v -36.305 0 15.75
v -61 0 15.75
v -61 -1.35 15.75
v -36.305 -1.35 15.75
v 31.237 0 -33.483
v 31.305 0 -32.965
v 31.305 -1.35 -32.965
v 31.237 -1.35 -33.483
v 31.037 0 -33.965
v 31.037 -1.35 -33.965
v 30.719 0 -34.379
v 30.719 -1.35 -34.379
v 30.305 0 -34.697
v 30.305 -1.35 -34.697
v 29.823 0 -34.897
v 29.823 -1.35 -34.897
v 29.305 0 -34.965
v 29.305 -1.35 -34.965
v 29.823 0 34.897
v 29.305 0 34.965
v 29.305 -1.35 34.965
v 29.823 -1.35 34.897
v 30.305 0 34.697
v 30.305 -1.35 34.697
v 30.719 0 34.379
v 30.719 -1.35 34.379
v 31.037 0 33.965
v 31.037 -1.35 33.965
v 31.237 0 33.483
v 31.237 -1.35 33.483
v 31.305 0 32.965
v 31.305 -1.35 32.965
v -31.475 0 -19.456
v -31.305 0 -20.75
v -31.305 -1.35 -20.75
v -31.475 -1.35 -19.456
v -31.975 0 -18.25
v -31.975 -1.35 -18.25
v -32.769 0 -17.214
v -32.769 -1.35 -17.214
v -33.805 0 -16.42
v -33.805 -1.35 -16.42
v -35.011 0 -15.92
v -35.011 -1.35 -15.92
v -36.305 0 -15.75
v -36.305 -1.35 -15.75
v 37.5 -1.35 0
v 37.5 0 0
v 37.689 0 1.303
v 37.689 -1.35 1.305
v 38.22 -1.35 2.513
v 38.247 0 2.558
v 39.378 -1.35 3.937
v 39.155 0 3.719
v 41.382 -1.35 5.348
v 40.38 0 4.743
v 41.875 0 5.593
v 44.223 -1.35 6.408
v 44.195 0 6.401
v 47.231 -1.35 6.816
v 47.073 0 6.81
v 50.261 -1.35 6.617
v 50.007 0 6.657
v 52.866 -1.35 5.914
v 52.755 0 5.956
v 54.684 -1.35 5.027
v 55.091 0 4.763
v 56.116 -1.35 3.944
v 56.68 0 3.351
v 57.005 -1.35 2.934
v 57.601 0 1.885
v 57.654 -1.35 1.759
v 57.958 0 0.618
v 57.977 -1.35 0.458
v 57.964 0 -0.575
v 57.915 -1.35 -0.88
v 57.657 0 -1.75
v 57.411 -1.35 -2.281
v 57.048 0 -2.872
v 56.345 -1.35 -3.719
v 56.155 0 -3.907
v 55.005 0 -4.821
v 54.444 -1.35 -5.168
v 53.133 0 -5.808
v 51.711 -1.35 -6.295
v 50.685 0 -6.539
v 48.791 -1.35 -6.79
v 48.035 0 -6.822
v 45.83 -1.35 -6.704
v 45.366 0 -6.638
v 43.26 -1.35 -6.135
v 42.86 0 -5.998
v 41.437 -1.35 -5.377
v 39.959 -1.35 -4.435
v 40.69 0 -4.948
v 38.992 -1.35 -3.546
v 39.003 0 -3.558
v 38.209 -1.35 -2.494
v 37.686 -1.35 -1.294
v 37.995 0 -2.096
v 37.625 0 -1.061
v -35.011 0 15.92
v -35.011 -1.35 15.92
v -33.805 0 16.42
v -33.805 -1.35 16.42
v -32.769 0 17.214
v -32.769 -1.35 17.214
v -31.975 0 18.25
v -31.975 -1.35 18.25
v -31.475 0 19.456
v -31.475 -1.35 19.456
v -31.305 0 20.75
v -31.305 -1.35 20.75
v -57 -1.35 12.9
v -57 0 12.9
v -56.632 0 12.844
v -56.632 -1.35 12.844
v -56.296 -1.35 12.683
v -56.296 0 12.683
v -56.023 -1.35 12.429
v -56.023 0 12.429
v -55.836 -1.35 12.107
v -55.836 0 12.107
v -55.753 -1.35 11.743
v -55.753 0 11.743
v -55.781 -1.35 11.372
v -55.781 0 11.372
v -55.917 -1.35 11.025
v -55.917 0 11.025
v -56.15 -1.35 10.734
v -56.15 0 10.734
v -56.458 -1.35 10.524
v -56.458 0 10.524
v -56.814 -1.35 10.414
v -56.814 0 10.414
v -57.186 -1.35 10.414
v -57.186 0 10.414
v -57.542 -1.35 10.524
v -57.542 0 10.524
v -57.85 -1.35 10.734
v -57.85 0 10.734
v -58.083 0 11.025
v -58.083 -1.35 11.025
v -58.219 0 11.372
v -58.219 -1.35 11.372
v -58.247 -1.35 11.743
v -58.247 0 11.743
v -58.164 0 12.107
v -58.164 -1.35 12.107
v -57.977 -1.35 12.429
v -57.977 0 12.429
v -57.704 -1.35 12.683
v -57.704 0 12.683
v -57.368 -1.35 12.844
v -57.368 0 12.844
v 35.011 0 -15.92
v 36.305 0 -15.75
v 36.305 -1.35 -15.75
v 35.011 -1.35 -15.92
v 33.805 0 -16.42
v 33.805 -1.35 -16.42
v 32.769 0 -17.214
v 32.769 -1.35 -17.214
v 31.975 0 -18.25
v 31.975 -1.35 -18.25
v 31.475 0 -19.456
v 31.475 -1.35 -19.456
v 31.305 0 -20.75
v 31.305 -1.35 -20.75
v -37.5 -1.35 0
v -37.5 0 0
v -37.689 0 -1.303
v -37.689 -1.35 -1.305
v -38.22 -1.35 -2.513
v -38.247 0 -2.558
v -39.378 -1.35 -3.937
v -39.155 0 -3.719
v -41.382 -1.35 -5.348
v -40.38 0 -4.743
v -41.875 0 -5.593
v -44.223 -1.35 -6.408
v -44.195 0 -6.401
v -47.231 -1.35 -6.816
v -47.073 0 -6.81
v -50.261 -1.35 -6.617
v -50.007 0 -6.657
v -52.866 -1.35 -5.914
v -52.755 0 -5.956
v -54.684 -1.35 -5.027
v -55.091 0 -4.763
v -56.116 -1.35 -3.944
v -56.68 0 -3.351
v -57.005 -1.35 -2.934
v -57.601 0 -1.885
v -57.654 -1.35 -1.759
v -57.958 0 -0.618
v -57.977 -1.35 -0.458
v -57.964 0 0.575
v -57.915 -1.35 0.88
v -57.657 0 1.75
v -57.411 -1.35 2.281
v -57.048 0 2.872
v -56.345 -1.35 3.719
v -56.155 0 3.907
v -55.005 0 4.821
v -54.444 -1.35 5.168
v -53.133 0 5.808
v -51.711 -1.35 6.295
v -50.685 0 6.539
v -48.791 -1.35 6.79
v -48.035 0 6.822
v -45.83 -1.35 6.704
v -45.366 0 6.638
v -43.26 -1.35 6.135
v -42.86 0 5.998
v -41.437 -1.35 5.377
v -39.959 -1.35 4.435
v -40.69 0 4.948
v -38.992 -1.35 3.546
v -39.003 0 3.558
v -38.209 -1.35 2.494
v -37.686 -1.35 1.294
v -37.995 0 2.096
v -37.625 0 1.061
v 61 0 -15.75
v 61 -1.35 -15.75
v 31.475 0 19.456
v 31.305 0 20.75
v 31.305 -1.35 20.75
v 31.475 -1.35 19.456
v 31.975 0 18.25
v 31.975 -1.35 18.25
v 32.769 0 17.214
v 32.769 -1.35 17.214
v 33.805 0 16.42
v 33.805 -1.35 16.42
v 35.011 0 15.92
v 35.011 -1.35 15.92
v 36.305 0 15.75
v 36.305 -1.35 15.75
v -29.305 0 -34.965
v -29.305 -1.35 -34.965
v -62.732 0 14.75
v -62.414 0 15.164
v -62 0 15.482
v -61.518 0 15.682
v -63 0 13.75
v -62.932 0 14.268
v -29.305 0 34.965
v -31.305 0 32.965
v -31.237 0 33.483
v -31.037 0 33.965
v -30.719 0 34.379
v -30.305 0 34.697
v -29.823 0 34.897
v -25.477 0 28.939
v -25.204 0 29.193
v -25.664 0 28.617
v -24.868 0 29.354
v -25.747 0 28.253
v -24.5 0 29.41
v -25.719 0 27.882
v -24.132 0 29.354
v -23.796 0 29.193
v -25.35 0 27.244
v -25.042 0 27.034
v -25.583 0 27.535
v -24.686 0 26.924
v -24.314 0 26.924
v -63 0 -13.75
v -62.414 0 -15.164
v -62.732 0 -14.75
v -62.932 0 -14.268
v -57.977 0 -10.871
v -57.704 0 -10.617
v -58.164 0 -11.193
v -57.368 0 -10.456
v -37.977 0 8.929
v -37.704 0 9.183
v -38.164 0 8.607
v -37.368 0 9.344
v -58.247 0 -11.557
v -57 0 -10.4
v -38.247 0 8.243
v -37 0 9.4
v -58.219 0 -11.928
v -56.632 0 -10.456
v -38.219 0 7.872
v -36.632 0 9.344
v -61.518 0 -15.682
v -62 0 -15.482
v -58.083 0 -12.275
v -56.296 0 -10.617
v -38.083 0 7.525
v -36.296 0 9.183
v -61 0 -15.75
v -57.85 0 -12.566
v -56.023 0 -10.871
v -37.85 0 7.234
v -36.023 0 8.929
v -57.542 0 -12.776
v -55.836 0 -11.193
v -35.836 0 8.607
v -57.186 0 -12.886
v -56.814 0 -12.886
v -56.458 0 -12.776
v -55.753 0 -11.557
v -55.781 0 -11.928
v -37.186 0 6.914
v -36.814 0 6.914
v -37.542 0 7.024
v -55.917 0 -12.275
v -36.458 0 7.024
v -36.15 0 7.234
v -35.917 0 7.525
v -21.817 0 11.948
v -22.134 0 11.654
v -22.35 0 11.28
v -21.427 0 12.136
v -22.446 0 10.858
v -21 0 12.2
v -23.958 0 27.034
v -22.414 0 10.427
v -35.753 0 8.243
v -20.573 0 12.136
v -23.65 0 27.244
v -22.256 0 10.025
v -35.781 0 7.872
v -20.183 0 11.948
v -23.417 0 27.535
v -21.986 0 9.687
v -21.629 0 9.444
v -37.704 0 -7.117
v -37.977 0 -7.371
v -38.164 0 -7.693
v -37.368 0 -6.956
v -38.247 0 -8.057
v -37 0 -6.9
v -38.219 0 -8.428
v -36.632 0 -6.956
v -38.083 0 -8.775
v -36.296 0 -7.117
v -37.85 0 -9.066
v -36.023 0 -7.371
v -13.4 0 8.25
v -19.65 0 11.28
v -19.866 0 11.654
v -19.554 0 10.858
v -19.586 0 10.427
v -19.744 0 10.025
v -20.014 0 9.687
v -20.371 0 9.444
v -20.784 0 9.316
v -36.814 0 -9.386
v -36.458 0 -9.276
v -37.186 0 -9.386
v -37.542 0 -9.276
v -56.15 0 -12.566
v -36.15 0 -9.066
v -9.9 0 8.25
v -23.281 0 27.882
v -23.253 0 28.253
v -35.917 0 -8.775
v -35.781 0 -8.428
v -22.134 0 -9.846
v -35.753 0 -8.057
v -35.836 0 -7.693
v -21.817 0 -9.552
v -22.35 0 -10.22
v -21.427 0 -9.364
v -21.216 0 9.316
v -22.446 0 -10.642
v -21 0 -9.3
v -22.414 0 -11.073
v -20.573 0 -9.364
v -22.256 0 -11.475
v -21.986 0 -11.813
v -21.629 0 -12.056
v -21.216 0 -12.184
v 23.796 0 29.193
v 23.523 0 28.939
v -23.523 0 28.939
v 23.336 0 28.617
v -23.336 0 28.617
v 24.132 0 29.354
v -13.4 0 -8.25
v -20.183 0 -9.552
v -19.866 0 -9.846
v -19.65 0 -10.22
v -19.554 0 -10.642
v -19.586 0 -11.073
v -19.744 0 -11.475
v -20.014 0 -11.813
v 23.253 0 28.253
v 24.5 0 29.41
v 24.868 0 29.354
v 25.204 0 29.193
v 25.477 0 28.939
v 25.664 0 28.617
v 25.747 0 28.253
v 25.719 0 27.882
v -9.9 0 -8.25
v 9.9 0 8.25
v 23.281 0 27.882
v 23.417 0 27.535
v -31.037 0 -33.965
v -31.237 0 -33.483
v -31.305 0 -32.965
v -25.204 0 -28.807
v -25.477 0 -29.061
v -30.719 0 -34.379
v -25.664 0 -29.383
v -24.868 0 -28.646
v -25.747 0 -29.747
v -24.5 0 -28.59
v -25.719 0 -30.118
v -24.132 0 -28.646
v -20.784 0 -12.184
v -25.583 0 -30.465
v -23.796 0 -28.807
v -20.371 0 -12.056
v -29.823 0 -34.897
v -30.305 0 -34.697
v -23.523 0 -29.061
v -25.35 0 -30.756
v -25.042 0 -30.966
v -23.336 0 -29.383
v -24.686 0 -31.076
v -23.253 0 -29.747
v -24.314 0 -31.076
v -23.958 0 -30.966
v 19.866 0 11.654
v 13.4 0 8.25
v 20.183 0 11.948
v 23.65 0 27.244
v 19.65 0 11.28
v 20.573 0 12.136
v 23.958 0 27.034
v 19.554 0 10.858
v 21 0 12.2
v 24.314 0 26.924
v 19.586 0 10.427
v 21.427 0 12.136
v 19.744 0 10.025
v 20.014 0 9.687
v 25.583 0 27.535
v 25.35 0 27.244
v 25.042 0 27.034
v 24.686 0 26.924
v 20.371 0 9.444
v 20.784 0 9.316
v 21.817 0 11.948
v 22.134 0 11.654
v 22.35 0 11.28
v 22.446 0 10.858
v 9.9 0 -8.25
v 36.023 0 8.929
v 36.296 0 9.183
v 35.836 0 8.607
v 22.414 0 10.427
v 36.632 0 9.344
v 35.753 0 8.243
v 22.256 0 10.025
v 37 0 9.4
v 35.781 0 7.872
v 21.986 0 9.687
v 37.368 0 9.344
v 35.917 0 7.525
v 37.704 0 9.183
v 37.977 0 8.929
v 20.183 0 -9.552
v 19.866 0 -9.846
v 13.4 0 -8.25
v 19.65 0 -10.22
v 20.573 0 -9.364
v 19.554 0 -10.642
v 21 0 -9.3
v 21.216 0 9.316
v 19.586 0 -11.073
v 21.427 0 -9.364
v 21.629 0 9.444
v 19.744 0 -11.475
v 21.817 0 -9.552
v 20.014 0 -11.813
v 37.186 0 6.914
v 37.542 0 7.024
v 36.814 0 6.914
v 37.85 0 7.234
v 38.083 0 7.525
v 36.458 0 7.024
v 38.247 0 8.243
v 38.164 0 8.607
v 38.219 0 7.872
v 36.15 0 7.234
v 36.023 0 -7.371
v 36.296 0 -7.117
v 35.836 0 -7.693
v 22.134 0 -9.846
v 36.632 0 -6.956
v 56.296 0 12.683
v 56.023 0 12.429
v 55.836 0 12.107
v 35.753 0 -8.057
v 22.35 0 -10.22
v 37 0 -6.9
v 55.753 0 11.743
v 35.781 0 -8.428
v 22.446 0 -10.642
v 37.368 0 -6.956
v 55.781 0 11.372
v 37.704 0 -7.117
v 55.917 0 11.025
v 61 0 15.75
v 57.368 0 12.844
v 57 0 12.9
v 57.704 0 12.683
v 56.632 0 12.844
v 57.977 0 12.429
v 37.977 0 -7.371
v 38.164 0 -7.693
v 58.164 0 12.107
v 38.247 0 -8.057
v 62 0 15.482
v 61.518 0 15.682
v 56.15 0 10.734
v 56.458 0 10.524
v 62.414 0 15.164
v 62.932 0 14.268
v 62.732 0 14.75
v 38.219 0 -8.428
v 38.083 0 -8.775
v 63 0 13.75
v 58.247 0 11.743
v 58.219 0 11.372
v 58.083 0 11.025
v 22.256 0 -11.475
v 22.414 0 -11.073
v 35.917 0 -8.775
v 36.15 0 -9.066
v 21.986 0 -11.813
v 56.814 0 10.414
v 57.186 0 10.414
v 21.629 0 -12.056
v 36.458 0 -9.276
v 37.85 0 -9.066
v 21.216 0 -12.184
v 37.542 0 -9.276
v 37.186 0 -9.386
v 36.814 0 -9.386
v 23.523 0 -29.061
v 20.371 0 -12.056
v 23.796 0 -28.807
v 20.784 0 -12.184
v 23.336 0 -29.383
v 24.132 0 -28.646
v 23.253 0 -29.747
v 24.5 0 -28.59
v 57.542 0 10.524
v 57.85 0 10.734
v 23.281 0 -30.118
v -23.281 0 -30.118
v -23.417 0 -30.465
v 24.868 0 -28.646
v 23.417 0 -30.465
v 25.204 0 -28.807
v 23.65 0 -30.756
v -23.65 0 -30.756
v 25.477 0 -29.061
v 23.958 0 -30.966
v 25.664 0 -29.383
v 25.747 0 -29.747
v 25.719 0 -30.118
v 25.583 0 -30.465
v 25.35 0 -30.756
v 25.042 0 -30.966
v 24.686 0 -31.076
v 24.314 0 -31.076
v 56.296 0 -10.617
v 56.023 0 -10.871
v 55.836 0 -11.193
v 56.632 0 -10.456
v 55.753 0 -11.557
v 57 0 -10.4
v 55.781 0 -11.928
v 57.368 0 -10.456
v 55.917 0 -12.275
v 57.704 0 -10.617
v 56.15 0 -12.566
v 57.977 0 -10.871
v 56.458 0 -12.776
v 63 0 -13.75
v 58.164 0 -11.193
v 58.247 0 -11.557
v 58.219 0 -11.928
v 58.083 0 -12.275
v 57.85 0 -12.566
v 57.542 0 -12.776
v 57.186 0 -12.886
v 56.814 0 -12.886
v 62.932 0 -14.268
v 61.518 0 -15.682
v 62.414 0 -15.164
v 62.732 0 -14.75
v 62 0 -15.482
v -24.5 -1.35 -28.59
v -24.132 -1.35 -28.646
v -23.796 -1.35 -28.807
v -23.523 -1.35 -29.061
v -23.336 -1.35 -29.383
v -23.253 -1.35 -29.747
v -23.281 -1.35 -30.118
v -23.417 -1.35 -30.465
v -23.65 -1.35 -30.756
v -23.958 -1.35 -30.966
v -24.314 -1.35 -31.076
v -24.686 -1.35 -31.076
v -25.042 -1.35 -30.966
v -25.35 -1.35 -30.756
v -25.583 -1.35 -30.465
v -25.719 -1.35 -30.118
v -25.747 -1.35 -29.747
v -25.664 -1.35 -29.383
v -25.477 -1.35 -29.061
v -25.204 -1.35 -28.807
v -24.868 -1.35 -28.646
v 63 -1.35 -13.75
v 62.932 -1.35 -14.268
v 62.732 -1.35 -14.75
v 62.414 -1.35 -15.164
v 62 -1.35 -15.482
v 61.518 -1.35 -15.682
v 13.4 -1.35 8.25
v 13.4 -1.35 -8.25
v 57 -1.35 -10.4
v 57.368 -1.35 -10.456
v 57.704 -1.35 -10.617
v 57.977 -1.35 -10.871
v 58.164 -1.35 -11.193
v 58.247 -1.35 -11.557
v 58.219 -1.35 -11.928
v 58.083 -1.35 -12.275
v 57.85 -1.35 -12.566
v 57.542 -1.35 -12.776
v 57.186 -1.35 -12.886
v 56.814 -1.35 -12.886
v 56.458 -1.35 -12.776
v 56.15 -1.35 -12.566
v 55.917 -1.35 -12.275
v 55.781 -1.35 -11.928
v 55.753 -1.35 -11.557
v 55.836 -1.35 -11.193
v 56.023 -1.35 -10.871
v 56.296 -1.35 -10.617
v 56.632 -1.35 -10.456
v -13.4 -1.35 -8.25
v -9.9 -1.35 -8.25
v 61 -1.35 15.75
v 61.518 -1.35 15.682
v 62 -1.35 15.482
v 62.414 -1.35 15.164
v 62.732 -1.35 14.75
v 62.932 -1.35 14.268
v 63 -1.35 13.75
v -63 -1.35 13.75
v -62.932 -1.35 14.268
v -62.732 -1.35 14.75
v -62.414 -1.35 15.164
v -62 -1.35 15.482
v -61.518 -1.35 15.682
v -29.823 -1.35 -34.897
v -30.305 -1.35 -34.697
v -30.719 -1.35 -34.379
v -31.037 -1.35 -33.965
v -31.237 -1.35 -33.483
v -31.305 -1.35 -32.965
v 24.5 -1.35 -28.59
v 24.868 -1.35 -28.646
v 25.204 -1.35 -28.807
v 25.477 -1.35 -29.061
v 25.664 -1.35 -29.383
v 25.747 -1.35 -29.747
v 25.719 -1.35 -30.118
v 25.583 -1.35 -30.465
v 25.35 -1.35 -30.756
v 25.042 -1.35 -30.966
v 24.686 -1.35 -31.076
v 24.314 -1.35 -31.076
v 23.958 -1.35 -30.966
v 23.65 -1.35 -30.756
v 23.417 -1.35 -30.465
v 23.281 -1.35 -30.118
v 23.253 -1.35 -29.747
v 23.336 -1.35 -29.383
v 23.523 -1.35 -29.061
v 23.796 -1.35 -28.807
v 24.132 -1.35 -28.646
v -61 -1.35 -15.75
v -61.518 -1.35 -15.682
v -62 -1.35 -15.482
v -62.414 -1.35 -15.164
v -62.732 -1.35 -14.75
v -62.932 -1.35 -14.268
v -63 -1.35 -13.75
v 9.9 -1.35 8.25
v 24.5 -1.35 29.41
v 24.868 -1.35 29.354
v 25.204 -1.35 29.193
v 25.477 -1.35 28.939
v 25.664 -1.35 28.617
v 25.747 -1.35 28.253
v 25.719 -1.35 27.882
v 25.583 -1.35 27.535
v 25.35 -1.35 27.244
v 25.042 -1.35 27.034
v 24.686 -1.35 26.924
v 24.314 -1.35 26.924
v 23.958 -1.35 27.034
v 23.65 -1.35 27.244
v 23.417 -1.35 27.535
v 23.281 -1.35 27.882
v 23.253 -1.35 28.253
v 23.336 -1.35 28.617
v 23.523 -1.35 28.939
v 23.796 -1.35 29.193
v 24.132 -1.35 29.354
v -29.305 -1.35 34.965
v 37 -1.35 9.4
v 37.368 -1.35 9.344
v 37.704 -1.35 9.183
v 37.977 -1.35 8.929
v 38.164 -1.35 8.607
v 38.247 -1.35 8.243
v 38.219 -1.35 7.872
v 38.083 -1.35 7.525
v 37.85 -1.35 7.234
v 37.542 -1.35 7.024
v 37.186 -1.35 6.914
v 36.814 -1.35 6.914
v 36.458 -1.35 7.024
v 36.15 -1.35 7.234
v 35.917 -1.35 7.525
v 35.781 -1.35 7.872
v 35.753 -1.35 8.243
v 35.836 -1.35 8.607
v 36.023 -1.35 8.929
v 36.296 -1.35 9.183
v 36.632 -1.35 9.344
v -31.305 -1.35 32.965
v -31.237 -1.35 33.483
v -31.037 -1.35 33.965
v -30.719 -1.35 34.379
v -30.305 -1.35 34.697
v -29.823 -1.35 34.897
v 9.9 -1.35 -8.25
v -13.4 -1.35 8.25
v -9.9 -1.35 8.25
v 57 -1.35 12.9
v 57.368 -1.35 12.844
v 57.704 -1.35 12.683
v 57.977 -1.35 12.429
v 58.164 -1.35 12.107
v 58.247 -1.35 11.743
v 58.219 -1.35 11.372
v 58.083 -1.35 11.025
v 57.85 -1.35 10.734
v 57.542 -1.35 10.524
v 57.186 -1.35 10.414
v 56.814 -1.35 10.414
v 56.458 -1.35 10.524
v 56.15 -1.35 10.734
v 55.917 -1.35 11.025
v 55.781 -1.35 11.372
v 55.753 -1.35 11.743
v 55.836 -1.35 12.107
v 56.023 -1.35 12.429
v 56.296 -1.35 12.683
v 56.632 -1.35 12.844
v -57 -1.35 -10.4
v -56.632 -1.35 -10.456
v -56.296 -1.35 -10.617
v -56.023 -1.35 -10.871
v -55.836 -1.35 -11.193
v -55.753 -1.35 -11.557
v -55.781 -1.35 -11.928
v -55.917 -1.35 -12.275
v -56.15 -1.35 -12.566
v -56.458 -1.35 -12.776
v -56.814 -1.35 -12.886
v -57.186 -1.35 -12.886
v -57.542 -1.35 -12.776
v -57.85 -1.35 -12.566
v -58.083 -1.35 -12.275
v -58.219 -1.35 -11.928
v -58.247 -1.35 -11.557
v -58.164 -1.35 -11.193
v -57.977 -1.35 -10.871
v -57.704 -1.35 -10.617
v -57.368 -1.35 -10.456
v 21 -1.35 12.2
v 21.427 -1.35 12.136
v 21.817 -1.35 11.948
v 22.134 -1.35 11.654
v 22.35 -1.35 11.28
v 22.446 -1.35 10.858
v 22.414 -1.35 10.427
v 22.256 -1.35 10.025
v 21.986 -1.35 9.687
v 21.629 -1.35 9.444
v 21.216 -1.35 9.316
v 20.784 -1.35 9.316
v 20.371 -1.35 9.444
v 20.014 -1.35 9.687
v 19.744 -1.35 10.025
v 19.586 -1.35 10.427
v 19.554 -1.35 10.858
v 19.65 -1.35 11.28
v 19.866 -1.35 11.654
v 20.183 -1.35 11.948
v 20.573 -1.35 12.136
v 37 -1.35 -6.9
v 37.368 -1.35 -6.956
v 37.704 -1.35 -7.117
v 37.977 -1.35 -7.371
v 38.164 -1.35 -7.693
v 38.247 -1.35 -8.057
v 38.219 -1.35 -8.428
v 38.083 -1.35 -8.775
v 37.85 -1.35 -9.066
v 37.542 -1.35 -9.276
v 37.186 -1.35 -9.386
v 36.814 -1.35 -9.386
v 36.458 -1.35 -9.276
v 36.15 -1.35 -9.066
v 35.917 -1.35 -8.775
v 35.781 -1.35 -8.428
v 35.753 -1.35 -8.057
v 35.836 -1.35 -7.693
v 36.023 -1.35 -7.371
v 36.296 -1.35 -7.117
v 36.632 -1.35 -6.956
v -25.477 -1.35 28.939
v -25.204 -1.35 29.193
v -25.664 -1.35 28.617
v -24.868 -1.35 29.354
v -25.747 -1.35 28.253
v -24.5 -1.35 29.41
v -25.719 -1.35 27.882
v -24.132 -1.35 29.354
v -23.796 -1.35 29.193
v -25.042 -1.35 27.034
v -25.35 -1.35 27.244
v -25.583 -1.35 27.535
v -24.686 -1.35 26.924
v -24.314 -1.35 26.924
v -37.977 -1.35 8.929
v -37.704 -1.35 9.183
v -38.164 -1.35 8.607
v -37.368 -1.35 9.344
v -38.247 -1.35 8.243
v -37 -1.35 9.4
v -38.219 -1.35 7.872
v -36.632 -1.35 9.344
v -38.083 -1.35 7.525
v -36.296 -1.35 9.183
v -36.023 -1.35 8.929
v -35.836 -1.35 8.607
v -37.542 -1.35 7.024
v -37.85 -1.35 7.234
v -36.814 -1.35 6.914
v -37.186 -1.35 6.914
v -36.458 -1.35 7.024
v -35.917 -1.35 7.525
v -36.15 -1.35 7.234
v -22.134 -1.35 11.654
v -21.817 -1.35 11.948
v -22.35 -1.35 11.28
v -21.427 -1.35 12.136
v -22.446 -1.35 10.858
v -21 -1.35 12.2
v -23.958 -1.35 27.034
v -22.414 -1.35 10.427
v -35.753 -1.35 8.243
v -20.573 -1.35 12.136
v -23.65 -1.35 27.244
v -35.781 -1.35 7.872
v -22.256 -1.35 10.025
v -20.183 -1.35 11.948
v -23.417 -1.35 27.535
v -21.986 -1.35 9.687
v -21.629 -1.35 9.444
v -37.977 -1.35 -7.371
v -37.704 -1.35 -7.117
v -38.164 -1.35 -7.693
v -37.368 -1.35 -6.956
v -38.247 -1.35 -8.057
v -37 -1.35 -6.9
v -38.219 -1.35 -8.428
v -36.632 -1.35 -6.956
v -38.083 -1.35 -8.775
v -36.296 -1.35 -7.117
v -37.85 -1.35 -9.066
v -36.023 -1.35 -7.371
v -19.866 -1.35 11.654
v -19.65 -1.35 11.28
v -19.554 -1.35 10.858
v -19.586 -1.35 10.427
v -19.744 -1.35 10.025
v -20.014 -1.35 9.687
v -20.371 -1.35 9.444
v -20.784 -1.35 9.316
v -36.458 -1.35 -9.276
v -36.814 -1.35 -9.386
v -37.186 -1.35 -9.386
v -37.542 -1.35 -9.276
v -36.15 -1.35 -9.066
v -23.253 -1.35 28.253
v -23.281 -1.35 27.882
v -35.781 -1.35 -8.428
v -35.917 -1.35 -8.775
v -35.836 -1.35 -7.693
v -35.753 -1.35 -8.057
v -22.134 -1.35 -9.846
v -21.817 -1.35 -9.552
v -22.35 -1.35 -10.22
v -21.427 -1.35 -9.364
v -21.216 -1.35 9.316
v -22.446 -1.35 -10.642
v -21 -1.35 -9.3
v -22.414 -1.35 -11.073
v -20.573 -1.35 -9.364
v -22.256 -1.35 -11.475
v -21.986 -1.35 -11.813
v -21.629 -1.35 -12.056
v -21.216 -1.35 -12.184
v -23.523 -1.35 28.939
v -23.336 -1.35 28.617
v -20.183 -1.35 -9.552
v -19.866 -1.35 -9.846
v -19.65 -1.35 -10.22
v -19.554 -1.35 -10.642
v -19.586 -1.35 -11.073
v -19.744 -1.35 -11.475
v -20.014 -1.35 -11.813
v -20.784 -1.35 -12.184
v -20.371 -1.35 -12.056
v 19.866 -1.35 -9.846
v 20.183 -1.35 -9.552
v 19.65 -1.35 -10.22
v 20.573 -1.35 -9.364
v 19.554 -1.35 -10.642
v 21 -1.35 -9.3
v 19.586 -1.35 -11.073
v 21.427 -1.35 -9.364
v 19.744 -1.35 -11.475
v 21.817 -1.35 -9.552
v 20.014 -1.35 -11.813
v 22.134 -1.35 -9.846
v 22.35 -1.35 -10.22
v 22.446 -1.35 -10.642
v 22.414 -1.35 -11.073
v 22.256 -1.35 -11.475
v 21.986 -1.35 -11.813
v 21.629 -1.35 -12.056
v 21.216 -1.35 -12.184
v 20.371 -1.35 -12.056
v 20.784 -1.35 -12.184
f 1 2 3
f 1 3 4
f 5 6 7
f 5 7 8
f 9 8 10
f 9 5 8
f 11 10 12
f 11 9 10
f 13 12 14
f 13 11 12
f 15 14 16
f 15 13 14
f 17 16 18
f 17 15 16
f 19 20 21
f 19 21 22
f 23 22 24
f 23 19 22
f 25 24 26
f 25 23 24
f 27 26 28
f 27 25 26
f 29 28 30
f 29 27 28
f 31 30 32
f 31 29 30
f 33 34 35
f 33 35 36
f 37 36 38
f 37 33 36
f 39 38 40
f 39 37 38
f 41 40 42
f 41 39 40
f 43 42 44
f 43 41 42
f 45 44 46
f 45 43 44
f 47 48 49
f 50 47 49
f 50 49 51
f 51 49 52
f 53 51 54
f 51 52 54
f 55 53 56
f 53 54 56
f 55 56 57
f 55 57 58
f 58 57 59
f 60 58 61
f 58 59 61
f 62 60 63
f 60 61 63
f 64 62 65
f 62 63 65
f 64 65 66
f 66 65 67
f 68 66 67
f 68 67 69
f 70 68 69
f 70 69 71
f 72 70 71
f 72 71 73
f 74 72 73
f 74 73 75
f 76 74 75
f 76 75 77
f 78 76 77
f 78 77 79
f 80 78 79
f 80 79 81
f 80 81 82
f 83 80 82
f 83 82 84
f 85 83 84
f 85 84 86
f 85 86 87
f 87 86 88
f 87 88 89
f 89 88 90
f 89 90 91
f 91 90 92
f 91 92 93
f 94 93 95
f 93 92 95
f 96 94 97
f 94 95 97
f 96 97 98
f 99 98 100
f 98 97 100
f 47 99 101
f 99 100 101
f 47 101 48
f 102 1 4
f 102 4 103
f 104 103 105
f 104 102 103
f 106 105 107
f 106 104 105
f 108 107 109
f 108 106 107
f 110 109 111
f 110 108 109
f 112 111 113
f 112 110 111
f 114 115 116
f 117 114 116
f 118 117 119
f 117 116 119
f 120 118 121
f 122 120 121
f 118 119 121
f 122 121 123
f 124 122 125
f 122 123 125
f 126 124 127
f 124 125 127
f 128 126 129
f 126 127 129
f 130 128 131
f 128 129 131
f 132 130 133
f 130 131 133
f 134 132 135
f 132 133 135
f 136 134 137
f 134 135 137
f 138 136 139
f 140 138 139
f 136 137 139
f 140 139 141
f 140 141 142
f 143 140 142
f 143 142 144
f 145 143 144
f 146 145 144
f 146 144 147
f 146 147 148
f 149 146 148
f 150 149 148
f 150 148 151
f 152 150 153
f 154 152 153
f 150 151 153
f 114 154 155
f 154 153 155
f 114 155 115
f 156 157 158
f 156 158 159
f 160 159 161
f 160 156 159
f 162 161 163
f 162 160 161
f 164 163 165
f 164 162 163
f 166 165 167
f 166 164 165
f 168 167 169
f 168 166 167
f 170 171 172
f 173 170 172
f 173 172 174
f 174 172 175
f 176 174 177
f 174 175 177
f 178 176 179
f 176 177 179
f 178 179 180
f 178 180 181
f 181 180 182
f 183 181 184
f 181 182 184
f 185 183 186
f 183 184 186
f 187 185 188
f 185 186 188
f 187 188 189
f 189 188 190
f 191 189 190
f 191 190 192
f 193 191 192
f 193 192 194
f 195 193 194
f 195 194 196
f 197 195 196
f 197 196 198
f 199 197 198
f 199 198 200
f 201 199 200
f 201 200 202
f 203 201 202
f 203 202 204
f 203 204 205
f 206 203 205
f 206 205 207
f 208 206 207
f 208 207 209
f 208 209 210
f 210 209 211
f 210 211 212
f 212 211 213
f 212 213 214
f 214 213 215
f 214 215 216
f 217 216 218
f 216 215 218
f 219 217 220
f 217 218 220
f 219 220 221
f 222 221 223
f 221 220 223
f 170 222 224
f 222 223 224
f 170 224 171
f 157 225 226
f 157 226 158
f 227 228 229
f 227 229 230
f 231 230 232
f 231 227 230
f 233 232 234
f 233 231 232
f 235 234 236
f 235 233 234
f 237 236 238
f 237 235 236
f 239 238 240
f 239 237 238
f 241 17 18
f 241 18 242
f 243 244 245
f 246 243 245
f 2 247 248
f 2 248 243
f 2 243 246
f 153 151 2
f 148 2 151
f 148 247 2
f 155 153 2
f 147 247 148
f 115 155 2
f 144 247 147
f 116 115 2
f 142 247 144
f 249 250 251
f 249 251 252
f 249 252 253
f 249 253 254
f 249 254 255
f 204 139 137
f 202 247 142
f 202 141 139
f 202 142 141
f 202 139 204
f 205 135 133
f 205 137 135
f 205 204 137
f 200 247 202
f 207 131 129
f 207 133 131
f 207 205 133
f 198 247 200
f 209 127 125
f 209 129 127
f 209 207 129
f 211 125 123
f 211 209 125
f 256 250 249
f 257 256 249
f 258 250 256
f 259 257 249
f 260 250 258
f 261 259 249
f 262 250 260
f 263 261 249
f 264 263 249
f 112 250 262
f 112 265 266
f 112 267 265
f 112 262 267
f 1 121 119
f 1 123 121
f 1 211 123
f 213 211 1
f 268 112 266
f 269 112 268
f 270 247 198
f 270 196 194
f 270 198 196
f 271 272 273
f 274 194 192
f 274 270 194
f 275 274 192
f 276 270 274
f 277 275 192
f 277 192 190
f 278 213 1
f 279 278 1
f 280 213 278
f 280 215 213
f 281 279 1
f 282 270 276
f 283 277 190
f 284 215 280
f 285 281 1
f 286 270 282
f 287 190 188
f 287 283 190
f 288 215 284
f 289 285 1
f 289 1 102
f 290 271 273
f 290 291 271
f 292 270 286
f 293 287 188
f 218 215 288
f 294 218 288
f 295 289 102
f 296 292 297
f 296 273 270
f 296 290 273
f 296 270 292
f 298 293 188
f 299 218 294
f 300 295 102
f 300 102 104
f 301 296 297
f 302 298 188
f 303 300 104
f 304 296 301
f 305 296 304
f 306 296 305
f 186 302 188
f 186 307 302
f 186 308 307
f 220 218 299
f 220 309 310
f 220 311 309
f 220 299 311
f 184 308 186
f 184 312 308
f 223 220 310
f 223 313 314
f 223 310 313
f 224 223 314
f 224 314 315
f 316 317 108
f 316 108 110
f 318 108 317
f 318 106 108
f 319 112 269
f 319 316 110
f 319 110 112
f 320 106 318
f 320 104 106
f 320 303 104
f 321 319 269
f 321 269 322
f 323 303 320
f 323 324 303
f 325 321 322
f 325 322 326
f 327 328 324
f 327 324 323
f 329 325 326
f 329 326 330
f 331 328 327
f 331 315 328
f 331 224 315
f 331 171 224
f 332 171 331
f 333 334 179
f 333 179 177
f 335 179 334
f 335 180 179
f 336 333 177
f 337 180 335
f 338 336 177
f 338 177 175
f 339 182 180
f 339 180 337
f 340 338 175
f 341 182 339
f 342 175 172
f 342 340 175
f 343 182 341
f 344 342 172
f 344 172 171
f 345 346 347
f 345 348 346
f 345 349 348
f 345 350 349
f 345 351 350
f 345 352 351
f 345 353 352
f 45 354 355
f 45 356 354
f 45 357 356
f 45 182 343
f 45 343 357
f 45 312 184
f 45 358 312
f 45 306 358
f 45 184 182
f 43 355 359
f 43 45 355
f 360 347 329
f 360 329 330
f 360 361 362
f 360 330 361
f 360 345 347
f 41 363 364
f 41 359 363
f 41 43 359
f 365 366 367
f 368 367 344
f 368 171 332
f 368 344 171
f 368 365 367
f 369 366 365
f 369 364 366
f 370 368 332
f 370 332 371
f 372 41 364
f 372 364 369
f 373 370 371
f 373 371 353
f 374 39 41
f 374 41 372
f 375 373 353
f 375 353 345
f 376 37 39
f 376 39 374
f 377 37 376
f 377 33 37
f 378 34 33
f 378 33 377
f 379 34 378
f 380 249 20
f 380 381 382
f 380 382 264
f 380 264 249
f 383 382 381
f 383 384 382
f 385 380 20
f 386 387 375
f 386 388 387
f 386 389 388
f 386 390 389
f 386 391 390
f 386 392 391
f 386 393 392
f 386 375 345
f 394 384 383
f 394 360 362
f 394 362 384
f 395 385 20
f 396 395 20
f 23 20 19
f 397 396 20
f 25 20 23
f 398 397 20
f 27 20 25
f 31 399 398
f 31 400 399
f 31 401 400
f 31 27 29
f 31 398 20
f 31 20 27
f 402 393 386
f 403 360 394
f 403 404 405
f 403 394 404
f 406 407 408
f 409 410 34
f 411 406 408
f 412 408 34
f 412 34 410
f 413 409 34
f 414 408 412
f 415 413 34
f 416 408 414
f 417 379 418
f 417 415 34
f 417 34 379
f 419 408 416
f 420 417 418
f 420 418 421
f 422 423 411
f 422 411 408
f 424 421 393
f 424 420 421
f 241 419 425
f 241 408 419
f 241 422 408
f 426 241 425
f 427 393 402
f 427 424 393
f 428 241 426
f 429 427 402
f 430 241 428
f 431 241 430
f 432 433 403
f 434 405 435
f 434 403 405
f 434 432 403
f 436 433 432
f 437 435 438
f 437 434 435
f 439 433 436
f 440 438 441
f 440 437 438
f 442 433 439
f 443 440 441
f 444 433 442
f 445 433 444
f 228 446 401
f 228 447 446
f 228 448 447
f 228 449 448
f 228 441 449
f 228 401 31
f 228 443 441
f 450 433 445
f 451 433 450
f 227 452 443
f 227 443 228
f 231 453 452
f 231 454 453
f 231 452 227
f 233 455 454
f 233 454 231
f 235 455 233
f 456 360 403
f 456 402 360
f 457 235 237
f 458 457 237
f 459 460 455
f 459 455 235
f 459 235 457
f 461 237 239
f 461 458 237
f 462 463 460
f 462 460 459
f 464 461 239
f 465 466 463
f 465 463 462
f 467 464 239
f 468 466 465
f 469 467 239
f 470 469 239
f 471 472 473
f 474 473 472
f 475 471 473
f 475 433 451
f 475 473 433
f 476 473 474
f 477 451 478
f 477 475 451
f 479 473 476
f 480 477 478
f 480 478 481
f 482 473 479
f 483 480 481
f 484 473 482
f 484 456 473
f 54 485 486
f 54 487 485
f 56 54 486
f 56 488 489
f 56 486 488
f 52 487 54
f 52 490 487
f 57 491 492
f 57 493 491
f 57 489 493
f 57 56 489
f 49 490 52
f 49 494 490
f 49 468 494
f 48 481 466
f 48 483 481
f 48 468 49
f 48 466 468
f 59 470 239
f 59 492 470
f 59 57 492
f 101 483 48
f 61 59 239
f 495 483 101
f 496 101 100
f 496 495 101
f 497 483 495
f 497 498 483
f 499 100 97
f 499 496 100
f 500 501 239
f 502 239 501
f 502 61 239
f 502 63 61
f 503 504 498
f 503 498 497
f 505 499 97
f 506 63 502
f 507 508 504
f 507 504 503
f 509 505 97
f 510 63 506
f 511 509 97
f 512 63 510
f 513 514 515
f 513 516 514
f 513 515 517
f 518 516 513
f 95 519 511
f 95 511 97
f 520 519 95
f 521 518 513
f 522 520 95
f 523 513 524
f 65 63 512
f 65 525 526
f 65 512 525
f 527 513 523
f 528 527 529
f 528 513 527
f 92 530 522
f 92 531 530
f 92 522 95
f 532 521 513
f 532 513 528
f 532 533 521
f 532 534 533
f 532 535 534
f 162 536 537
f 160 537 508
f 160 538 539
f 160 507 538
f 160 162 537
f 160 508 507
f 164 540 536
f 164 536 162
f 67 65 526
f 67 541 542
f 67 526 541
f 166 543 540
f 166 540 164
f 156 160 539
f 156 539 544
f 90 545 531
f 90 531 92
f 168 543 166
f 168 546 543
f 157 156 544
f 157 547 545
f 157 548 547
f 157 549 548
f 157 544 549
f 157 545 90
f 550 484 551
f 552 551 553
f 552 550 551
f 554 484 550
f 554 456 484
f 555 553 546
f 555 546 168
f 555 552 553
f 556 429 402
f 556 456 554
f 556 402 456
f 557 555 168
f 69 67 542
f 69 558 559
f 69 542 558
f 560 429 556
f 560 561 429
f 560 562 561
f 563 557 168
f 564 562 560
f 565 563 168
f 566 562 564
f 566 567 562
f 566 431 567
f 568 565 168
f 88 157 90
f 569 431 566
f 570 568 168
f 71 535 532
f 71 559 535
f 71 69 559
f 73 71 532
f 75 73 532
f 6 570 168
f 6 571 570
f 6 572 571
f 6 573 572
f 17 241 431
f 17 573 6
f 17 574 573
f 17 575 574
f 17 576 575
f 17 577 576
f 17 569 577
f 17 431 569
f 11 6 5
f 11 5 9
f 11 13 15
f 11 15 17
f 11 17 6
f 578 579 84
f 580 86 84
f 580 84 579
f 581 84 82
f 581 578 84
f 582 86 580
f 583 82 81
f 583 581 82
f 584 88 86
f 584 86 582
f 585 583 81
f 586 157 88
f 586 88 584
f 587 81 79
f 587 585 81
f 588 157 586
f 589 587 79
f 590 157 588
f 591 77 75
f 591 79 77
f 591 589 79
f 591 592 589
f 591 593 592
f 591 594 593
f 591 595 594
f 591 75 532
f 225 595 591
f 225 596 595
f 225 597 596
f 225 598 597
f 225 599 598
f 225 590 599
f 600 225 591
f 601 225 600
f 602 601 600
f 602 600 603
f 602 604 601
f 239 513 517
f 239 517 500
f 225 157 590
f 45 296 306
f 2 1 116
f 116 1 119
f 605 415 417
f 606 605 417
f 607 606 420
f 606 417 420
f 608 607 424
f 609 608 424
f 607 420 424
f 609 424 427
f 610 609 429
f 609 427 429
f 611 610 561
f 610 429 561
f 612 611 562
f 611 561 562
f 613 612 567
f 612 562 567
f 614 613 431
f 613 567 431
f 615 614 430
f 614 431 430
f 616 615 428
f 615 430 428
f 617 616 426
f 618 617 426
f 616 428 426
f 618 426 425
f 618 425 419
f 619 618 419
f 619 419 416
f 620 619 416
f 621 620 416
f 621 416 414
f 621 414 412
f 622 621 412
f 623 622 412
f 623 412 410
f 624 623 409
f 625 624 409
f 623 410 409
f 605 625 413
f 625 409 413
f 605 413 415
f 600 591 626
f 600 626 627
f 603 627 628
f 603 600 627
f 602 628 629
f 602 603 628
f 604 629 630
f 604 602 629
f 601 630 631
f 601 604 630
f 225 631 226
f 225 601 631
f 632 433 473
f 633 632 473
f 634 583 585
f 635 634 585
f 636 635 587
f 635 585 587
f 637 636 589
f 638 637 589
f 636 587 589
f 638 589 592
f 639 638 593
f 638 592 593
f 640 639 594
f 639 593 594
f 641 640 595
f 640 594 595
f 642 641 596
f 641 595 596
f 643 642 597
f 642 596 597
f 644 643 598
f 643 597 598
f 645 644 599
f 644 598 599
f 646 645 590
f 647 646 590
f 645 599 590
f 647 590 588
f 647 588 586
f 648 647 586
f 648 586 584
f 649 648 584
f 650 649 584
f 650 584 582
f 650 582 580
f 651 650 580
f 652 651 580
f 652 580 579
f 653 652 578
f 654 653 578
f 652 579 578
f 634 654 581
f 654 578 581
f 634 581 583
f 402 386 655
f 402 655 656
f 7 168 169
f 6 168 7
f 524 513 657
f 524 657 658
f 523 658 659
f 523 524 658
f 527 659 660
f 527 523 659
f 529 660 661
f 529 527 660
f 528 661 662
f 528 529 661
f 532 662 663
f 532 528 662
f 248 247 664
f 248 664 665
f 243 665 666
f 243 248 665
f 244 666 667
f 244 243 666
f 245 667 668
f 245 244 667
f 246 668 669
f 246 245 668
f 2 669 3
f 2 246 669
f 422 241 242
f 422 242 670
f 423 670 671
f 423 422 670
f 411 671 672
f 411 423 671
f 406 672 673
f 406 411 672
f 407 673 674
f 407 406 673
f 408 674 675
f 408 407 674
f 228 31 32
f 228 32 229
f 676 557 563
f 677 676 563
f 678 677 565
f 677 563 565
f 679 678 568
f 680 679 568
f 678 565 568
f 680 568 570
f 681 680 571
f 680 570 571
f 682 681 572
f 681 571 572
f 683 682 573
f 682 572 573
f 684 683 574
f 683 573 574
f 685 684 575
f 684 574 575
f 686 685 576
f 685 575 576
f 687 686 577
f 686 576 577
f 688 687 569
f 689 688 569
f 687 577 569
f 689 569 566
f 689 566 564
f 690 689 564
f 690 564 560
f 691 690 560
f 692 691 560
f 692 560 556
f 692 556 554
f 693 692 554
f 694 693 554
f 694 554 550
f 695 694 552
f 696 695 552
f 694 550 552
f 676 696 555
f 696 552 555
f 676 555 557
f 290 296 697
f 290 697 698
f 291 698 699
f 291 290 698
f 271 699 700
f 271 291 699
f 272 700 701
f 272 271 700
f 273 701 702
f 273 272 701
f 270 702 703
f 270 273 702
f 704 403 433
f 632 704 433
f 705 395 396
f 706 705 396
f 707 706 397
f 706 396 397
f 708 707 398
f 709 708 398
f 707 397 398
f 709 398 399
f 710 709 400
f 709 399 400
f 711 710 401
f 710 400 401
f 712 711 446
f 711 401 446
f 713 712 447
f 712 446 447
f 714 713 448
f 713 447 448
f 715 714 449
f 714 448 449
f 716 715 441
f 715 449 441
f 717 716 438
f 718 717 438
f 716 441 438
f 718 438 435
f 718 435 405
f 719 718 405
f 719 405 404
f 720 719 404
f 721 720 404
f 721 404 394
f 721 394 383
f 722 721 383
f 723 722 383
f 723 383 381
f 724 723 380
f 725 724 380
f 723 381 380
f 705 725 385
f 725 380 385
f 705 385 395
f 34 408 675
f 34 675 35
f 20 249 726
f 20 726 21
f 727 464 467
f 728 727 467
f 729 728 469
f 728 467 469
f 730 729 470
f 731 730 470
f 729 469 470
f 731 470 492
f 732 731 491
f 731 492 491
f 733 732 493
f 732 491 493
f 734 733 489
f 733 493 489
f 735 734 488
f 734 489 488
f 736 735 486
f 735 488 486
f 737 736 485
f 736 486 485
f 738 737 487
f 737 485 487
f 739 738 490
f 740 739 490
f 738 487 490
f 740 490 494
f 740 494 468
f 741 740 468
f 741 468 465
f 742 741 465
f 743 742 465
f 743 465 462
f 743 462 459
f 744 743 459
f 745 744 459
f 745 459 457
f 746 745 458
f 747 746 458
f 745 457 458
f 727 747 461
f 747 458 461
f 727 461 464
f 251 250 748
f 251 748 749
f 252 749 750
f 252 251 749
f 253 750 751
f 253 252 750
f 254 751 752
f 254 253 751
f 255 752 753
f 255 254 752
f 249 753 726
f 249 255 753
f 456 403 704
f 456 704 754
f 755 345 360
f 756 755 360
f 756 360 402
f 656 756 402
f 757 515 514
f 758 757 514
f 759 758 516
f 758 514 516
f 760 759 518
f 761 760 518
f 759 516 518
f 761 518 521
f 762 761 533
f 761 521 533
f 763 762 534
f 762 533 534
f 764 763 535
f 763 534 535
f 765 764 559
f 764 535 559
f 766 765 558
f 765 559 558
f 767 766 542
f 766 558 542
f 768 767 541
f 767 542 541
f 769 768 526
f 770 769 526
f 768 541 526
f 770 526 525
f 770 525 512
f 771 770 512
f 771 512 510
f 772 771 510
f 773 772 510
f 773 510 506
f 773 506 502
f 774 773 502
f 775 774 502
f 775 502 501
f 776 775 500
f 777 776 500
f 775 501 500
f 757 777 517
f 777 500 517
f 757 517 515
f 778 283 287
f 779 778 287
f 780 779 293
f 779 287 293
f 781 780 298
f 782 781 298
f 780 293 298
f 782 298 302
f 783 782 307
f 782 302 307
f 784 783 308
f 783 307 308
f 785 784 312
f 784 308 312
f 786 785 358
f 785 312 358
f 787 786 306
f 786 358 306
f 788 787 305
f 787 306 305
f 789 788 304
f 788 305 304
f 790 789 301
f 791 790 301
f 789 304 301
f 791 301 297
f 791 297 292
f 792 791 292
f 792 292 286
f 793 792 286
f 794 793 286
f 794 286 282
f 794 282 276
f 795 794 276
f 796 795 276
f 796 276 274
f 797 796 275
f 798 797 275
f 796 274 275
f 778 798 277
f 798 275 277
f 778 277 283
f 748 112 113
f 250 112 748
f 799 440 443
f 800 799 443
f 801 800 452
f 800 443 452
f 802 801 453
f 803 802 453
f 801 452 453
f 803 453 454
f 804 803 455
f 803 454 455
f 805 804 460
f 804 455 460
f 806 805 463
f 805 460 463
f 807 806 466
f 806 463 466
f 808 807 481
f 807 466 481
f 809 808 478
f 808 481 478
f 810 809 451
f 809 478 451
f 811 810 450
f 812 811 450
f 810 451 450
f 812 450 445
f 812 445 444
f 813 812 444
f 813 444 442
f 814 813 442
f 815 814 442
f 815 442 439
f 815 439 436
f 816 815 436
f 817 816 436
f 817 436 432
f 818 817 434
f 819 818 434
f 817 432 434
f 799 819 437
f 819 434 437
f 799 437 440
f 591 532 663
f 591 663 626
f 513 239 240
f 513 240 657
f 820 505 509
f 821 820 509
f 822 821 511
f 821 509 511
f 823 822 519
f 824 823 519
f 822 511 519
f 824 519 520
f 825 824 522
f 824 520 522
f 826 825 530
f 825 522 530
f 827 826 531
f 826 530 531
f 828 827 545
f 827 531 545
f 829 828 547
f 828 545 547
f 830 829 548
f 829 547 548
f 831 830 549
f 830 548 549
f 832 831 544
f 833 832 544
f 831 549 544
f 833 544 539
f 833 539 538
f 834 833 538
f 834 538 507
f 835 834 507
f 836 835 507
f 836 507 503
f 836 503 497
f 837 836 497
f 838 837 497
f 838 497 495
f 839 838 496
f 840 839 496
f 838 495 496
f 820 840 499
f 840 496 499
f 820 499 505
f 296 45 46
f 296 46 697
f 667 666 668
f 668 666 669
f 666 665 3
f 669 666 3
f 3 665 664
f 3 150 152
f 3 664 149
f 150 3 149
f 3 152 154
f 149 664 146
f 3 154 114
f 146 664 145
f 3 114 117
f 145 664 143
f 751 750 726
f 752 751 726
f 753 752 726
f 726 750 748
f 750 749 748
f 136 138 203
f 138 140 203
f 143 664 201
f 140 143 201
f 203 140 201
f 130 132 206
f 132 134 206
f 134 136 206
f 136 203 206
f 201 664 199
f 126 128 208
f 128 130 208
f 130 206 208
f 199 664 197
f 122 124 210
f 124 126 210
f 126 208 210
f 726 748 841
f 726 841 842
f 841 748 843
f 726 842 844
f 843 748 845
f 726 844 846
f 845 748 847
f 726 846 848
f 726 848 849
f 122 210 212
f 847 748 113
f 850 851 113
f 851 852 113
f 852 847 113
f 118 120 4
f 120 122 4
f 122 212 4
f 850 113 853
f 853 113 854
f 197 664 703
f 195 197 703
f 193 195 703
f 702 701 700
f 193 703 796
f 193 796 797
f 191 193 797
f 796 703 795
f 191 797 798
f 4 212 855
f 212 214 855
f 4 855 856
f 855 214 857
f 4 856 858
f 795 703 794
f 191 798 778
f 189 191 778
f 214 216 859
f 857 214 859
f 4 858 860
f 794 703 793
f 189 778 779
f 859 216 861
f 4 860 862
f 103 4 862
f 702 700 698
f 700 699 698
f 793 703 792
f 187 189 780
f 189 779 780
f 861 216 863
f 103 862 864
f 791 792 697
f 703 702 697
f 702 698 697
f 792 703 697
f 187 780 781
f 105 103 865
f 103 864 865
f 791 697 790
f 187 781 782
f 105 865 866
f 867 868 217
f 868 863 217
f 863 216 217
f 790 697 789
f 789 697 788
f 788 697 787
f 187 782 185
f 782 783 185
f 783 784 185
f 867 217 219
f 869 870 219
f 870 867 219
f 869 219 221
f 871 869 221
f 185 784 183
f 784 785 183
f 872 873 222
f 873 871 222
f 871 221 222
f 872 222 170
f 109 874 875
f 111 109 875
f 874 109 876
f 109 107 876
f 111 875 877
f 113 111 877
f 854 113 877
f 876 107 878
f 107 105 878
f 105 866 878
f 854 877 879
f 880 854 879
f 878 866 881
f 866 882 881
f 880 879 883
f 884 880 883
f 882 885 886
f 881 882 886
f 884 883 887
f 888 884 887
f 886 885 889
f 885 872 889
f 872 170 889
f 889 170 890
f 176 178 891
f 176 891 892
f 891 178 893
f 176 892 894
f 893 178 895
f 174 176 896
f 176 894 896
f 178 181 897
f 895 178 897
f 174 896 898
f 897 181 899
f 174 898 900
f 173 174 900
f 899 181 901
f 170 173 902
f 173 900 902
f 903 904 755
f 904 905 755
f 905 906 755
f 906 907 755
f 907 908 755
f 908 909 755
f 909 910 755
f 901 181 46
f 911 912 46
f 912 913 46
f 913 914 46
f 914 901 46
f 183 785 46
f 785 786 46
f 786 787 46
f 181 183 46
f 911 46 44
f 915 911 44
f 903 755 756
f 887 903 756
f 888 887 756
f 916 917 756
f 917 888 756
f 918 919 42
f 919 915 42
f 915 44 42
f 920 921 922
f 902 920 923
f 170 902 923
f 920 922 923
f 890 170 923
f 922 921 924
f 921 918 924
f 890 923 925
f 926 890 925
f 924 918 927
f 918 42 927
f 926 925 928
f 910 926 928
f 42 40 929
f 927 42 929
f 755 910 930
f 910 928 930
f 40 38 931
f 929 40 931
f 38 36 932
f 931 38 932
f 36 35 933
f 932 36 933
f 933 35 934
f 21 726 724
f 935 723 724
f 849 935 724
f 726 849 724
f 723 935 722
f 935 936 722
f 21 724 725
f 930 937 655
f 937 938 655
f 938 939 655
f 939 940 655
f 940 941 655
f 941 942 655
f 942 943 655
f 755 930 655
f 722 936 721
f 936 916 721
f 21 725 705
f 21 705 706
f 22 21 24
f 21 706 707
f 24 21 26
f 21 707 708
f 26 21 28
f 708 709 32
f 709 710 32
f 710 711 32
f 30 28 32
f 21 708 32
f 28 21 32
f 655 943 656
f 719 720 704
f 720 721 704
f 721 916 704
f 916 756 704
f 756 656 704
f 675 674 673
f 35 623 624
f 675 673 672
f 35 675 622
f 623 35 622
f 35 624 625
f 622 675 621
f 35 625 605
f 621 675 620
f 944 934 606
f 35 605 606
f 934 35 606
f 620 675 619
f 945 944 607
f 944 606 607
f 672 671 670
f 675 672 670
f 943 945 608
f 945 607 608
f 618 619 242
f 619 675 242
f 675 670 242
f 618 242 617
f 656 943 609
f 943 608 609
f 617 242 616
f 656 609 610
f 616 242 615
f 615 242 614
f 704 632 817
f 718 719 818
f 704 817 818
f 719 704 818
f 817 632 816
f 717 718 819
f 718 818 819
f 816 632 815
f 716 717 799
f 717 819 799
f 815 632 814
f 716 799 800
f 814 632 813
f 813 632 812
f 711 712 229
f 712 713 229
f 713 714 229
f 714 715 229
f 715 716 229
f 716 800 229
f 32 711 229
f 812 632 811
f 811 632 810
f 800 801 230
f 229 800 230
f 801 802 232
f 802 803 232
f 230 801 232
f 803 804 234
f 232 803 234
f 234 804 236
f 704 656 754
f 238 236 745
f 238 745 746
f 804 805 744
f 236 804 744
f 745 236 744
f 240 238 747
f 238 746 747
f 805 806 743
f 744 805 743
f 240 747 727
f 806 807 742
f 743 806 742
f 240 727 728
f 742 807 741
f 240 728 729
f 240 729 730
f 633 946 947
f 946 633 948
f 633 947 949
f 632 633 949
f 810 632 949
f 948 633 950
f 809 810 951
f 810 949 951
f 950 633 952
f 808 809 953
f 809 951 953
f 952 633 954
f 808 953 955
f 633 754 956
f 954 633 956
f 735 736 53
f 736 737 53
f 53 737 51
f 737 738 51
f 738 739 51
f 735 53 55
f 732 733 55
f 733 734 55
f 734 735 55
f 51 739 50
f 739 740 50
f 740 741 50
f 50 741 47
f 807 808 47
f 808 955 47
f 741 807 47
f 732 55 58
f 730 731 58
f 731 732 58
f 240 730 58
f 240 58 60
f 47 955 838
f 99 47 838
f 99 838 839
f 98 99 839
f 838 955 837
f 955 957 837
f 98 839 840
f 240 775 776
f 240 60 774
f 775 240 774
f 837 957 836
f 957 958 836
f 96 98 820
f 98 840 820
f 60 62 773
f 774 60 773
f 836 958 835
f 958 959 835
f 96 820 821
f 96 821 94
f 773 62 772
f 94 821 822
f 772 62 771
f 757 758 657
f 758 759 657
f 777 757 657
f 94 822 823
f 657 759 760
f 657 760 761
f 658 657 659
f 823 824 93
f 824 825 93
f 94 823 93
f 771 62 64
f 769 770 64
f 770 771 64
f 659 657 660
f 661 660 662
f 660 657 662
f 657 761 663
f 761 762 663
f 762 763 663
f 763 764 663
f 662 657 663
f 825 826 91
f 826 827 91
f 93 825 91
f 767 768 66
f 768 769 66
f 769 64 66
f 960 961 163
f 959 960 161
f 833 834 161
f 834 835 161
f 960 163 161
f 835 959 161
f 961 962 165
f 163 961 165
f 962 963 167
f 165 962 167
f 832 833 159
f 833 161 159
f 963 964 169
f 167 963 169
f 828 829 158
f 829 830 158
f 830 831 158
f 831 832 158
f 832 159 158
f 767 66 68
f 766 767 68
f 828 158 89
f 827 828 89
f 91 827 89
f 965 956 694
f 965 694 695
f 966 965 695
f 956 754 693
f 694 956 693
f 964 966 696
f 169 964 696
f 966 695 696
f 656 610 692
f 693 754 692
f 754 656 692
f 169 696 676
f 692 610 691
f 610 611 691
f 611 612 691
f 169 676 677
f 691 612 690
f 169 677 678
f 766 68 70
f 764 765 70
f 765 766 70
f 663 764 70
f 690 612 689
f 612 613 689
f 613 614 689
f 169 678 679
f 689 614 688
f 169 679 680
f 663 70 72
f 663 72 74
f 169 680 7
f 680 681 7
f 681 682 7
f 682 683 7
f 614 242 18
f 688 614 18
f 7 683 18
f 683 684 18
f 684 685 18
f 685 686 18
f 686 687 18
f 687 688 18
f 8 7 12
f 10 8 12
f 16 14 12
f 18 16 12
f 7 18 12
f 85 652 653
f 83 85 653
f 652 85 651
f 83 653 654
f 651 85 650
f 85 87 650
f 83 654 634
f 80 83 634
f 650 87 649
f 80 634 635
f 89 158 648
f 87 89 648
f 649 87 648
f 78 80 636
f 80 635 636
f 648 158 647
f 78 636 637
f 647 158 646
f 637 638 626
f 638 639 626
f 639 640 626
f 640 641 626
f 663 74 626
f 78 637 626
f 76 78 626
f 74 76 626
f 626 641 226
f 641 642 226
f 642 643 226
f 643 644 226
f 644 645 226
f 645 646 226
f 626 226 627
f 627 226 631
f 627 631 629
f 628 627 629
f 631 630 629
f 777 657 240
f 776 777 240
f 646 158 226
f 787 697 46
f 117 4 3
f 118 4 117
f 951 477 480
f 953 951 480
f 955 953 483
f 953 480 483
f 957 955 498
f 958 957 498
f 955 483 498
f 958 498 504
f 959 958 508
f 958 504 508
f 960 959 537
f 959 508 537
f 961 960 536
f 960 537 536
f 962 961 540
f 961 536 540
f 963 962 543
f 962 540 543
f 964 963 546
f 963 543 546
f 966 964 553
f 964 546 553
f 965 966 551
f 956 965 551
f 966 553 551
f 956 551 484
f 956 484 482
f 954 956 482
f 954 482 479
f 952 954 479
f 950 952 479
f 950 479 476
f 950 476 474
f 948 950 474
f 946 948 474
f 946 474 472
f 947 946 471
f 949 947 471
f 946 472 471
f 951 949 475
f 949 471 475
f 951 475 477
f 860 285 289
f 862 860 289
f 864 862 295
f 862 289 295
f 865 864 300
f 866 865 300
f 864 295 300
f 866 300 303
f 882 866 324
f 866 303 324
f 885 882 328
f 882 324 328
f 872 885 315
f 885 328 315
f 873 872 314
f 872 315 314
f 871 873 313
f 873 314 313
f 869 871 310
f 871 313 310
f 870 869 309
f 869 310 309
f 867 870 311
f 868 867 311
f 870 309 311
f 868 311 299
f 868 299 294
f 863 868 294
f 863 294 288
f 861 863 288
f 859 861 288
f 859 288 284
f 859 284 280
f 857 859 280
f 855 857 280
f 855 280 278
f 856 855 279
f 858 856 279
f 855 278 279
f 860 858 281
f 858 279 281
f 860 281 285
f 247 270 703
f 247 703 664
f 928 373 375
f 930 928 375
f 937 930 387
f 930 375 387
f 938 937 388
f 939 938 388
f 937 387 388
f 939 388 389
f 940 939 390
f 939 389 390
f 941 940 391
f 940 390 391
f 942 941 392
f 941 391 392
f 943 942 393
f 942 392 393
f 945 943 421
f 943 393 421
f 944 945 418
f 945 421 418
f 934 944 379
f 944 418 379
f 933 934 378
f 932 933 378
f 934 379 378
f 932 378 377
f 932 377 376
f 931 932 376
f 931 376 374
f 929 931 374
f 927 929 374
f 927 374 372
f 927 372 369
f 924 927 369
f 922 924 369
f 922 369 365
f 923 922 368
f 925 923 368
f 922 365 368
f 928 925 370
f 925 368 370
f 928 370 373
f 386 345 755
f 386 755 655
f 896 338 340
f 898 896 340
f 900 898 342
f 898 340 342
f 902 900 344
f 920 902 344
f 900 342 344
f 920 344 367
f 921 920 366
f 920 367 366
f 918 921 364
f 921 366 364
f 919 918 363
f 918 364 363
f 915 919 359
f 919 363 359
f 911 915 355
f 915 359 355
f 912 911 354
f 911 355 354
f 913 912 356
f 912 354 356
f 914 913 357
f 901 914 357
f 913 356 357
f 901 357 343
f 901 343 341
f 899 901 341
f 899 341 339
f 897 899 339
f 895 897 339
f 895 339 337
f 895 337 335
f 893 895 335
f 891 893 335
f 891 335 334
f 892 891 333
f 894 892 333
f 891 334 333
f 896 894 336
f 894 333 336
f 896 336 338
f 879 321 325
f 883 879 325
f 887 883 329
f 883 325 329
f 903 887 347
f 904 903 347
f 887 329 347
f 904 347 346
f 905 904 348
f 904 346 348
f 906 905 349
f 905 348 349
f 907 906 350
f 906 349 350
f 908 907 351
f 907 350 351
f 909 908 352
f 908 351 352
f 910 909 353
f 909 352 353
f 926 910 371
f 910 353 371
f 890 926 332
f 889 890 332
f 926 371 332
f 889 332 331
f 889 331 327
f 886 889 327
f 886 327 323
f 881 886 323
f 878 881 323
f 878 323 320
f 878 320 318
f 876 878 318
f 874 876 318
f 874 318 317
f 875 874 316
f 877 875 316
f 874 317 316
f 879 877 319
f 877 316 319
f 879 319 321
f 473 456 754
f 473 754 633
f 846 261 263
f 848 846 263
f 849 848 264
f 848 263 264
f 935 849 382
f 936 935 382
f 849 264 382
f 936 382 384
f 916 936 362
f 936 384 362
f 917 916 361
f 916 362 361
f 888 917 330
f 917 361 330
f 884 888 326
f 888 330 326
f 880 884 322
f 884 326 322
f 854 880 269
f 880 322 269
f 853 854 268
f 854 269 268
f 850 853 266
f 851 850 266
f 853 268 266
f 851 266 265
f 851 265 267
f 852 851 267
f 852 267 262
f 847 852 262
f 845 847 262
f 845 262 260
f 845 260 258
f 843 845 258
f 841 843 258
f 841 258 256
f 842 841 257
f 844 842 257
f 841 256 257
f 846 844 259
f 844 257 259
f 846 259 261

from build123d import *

# Parameters (mm, degrees)
SKETCH2_R           = 1.45
SKETCH2_R_2         = 1.25
BOSS_EXTRUDE1_DEPTH = 1.35
CUT_EXTRUDE1_REACH  = 74.065
SKETCH5_RX          = 10.25
SKETCH5_RY          = 6.825
SKETCH5_W           = 3.5
SKETCH5_H           = 16.5


with BuildPart() as part:
    # Sketch2 → Boss-Extrude1 (new body)
    with BuildSketch(Plane(origin=(0, 0, 0), x_dir=(1, 0, 0), z_dir=(0, 1, 0))):
        with BuildLine():
            Line((-29.305, -34.965), (29.305, -34.965))
            ThreePointArc((29.305, -34.965), (30.719213562, -34.379213562), (31.305, -32.965))
            Line((31.305, -32.965), (31.305, -20.75))
            ThreePointArc((31.305, -20.75), (32.769466094, -17.214466094), (36.305, -15.75))
            Line((36.305, -15.75), (61, -15.75))
            ThreePointArc((61, -15.75), (62.414213562, -15.164213562), (63, -13.75))
            Line((63, -13.75), (63, 13.75))
            ThreePointArc((63, 13.75), (62.414213562, 15.164213562), (61, 15.75))
            Line((61, 15.75), (36.305, 15.75))
            ThreePointArc((36.305, 15.75), (32.769466094, 17.214466094), (31.305, 20.75))
            Line((31.305, 20.75), (31.305, 32.965))
            ThreePointArc((31.305, 32.965), (30.719213562, 34.379213562), (29.305, 34.965))
            Line((29.305, 34.965), (-29.305, 34.965))
            ThreePointArc((-29.305, 34.965), (-30.719213562, 34.379213562), (-31.305, 32.965))
            Line((-31.305, 32.965), (-31.305, 20.75))
            ThreePointArc((-31.305, 20.75), (-32.769466094, 17.214466094), (-36.305, 15.75))
            Line((-36.305, 15.75), (-61, 15.75))
            ThreePointArc((-61, 15.75), (-62.414213562, 15.164213562), (-63, 13.75))
            Line((-63, 13.75), (-63, -13.75))
            ThreePointArc((-63, -13.75), (-62.414213562, -15.164213562), (-61, -15.75))
            Line((-61, -15.75), (-36.305, -15.75))
            ThreePointArc((-36.305, -15.75), (-32.769466094, -17.214466094), (-31.305, -20.75))
            Line((-31.305, -20.75), (-31.305, -32.965))
            ThreePointArc((-31.305, -32.965), (-30.719213562, -34.379213562), (-29.305, -34.965))
        make_face()
        with Locations(Location((21, -10.75, 0), (0, 0, 270))):
            Circle(SKETCH2_R, mode=Mode.SUBTRACT)
        with Locations(Location((21, 10.75, 0), (0, 0, 270))):
            Circle(SKETCH2_R, mode=Mode.SUBTRACT)
        with Locations(Location((-21, 10.75, 0), (0, 0, 270))):
            Circle(SKETCH2_R, mode=Mode.SUBTRACT)
        with Locations(Location((-24.5, 29.84, 0), (0, 0, 270))):
            Circle(SKETCH2_R_2, mode=Mode.SUBTRACT)
        with Locations(Location((-21, -10.75, 0), (0, 0, 270))):
            Circle(SKETCH2_R, mode=Mode.SUBTRACT)
        with Locations(Location((-24.5, -28.16, 0), (0, 0, 270))):
            Circle(SKETCH2_R_2, mode=Mode.SUBTRACT)
        with Locations(Location((-57, -11.65, 0), (0, 0, 270))):
            Circle(SKETCH2_R_2, mode=Mode.SUBTRACT)
        with Locations(Location((24.5, -28.16, 0), (0, 0, 270))):
            Circle(SKETCH2_R_2, mode=Mode.SUBTRACT)
        with Locations(Location((-57, 11.65, 0), (0, 0, 270))):
            Circle(SKETCH2_R_2, mode=Mode.SUBTRACT)
        with Locations(Location((24.5, 29.84, 0), (0, 0, 270))):
            Circle(SKETCH2_R_2, mode=Mode.SUBTRACT)
        with Locations(Location((57, 11.65, 0), (0, 0, 270))):
            Circle(SKETCH2_R_2, mode=Mode.SUBTRACT)
        with Locations(Location((-37, 8.15, 0), (0, 0, 270))):
            Circle(SKETCH2_R_2, mode=Mode.SUBTRACT)
        with Locations(Location((-37, -8.15, 0), (0, 0, 270))):
            Circle(SKETCH2_R_2, mode=Mode.SUBTRACT)
        with Locations(Location((37, -8.15, 0), (0, 0, 270))):
            Circle(SKETCH2_R_2, mode=Mode.SUBTRACT)
        with Locations(Location((37, 8.15, 0), (0, 0, 270))):
            Circle(SKETCH2_R_2, mode=Mode.SUBTRACT)
        with Locations(Location((57, -11.65, 0), (0, 0, 270))):
            Circle(SKETCH2_R_2, mode=Mode.SUBTRACT)
    extrude(amount=-BOSS_EXTRUDE1_DEPTH)

    # Sketch5 → Cut-Extrude1 (cut, up to next)
    with BuildSketch(Plane(origin=(0, 0, 0), x_dir=(1, 0, 0), z_dir=(0, 1, 0)), mode=Mode.PRIVATE) as cut_extrude1_sk1:
        with Locations(Location((47.75, 0), (0, 0, 180))):
            Ellipse(SKETCH5_RX, SKETCH5_RY)
    cut_extrude1_tool1 = extrude(cut_extrude1_sk1.sketch, amount=-CUT_EXTRUDE1_REACH, mode=Mode.PRIVATE) & part.part
    # Sketch5 → Cut-Extrude1 (cut, up to next)
    with BuildSketch(Plane(origin=(0, 0, 0), x_dir=(1, 0, 0), z_dir=(0, 1, 0)), mode=Mode.PRIVATE) as cut_extrude1_sk2:
        with Locations(Location((-47.75, 0), (0, 0, 0))):
            Ellipse(SKETCH5_RX, SKETCH5_RY)
    cut_extrude1_tool2 = extrude(cut_extrude1_sk2.sketch, amount=-CUT_EXTRUDE1_REACH, mode=Mode.PRIVATE) & part.part
    # Sketch5 → Cut-Extrude1 (cut, up to next)
    with BuildSketch(Plane(origin=(0, 0, 0), x_dir=(1, 0, 0), z_dir=(0, 1, 0)), mode=Mode.PRIVATE) as cut_extrude1_sk3:
        with Locations((11.65, 0)):
            Rectangle(SKETCH5_W, SKETCH5_H)
    cut_extrude1_tool3 = extrude(cut_extrude1_sk3.sketch, amount=-CUT_EXTRUDE1_REACH, mode=Mode.PRIVATE) & part.part
    # Sketch5 → Cut-Extrude1 (cut, up to next)
    with BuildSketch(Plane(origin=(0, 0, 0), x_dir=(1, 0, 0), z_dir=(0, 1, 0)), mode=Mode.PRIVATE) as cut_extrude1_sk4:
        with Locations((-11.65, 0)):
            Rectangle(SKETCH5_W, SKETCH5_H)
    cut_extrude1_tool4 = extrude(cut_extrude1_sk4.sketch, amount=-CUT_EXTRUDE1_REACH, mode=Mode.PRIVATE) & part.part
    add(cut_extrude1_tool1.solids().sort_by_distance((47.75, 0, 0))[0], mode=Mode.SUBTRACT)
    add(cut_extrude1_tool2.solids().sort_by_distance((-47.75, 0, 0))[0], mode=Mode.SUBTRACT)
    add(cut_extrude1_tool3.solids().sort_by_distance((11.65, 0, 0))[0], mode=Mode.SUBTRACT)
    add(cut_extrude1_tool4.solids().sort_by_distance((-11.65, 0, 0))[0], mode=Mode.SUBTRACT)


solid = part.part
